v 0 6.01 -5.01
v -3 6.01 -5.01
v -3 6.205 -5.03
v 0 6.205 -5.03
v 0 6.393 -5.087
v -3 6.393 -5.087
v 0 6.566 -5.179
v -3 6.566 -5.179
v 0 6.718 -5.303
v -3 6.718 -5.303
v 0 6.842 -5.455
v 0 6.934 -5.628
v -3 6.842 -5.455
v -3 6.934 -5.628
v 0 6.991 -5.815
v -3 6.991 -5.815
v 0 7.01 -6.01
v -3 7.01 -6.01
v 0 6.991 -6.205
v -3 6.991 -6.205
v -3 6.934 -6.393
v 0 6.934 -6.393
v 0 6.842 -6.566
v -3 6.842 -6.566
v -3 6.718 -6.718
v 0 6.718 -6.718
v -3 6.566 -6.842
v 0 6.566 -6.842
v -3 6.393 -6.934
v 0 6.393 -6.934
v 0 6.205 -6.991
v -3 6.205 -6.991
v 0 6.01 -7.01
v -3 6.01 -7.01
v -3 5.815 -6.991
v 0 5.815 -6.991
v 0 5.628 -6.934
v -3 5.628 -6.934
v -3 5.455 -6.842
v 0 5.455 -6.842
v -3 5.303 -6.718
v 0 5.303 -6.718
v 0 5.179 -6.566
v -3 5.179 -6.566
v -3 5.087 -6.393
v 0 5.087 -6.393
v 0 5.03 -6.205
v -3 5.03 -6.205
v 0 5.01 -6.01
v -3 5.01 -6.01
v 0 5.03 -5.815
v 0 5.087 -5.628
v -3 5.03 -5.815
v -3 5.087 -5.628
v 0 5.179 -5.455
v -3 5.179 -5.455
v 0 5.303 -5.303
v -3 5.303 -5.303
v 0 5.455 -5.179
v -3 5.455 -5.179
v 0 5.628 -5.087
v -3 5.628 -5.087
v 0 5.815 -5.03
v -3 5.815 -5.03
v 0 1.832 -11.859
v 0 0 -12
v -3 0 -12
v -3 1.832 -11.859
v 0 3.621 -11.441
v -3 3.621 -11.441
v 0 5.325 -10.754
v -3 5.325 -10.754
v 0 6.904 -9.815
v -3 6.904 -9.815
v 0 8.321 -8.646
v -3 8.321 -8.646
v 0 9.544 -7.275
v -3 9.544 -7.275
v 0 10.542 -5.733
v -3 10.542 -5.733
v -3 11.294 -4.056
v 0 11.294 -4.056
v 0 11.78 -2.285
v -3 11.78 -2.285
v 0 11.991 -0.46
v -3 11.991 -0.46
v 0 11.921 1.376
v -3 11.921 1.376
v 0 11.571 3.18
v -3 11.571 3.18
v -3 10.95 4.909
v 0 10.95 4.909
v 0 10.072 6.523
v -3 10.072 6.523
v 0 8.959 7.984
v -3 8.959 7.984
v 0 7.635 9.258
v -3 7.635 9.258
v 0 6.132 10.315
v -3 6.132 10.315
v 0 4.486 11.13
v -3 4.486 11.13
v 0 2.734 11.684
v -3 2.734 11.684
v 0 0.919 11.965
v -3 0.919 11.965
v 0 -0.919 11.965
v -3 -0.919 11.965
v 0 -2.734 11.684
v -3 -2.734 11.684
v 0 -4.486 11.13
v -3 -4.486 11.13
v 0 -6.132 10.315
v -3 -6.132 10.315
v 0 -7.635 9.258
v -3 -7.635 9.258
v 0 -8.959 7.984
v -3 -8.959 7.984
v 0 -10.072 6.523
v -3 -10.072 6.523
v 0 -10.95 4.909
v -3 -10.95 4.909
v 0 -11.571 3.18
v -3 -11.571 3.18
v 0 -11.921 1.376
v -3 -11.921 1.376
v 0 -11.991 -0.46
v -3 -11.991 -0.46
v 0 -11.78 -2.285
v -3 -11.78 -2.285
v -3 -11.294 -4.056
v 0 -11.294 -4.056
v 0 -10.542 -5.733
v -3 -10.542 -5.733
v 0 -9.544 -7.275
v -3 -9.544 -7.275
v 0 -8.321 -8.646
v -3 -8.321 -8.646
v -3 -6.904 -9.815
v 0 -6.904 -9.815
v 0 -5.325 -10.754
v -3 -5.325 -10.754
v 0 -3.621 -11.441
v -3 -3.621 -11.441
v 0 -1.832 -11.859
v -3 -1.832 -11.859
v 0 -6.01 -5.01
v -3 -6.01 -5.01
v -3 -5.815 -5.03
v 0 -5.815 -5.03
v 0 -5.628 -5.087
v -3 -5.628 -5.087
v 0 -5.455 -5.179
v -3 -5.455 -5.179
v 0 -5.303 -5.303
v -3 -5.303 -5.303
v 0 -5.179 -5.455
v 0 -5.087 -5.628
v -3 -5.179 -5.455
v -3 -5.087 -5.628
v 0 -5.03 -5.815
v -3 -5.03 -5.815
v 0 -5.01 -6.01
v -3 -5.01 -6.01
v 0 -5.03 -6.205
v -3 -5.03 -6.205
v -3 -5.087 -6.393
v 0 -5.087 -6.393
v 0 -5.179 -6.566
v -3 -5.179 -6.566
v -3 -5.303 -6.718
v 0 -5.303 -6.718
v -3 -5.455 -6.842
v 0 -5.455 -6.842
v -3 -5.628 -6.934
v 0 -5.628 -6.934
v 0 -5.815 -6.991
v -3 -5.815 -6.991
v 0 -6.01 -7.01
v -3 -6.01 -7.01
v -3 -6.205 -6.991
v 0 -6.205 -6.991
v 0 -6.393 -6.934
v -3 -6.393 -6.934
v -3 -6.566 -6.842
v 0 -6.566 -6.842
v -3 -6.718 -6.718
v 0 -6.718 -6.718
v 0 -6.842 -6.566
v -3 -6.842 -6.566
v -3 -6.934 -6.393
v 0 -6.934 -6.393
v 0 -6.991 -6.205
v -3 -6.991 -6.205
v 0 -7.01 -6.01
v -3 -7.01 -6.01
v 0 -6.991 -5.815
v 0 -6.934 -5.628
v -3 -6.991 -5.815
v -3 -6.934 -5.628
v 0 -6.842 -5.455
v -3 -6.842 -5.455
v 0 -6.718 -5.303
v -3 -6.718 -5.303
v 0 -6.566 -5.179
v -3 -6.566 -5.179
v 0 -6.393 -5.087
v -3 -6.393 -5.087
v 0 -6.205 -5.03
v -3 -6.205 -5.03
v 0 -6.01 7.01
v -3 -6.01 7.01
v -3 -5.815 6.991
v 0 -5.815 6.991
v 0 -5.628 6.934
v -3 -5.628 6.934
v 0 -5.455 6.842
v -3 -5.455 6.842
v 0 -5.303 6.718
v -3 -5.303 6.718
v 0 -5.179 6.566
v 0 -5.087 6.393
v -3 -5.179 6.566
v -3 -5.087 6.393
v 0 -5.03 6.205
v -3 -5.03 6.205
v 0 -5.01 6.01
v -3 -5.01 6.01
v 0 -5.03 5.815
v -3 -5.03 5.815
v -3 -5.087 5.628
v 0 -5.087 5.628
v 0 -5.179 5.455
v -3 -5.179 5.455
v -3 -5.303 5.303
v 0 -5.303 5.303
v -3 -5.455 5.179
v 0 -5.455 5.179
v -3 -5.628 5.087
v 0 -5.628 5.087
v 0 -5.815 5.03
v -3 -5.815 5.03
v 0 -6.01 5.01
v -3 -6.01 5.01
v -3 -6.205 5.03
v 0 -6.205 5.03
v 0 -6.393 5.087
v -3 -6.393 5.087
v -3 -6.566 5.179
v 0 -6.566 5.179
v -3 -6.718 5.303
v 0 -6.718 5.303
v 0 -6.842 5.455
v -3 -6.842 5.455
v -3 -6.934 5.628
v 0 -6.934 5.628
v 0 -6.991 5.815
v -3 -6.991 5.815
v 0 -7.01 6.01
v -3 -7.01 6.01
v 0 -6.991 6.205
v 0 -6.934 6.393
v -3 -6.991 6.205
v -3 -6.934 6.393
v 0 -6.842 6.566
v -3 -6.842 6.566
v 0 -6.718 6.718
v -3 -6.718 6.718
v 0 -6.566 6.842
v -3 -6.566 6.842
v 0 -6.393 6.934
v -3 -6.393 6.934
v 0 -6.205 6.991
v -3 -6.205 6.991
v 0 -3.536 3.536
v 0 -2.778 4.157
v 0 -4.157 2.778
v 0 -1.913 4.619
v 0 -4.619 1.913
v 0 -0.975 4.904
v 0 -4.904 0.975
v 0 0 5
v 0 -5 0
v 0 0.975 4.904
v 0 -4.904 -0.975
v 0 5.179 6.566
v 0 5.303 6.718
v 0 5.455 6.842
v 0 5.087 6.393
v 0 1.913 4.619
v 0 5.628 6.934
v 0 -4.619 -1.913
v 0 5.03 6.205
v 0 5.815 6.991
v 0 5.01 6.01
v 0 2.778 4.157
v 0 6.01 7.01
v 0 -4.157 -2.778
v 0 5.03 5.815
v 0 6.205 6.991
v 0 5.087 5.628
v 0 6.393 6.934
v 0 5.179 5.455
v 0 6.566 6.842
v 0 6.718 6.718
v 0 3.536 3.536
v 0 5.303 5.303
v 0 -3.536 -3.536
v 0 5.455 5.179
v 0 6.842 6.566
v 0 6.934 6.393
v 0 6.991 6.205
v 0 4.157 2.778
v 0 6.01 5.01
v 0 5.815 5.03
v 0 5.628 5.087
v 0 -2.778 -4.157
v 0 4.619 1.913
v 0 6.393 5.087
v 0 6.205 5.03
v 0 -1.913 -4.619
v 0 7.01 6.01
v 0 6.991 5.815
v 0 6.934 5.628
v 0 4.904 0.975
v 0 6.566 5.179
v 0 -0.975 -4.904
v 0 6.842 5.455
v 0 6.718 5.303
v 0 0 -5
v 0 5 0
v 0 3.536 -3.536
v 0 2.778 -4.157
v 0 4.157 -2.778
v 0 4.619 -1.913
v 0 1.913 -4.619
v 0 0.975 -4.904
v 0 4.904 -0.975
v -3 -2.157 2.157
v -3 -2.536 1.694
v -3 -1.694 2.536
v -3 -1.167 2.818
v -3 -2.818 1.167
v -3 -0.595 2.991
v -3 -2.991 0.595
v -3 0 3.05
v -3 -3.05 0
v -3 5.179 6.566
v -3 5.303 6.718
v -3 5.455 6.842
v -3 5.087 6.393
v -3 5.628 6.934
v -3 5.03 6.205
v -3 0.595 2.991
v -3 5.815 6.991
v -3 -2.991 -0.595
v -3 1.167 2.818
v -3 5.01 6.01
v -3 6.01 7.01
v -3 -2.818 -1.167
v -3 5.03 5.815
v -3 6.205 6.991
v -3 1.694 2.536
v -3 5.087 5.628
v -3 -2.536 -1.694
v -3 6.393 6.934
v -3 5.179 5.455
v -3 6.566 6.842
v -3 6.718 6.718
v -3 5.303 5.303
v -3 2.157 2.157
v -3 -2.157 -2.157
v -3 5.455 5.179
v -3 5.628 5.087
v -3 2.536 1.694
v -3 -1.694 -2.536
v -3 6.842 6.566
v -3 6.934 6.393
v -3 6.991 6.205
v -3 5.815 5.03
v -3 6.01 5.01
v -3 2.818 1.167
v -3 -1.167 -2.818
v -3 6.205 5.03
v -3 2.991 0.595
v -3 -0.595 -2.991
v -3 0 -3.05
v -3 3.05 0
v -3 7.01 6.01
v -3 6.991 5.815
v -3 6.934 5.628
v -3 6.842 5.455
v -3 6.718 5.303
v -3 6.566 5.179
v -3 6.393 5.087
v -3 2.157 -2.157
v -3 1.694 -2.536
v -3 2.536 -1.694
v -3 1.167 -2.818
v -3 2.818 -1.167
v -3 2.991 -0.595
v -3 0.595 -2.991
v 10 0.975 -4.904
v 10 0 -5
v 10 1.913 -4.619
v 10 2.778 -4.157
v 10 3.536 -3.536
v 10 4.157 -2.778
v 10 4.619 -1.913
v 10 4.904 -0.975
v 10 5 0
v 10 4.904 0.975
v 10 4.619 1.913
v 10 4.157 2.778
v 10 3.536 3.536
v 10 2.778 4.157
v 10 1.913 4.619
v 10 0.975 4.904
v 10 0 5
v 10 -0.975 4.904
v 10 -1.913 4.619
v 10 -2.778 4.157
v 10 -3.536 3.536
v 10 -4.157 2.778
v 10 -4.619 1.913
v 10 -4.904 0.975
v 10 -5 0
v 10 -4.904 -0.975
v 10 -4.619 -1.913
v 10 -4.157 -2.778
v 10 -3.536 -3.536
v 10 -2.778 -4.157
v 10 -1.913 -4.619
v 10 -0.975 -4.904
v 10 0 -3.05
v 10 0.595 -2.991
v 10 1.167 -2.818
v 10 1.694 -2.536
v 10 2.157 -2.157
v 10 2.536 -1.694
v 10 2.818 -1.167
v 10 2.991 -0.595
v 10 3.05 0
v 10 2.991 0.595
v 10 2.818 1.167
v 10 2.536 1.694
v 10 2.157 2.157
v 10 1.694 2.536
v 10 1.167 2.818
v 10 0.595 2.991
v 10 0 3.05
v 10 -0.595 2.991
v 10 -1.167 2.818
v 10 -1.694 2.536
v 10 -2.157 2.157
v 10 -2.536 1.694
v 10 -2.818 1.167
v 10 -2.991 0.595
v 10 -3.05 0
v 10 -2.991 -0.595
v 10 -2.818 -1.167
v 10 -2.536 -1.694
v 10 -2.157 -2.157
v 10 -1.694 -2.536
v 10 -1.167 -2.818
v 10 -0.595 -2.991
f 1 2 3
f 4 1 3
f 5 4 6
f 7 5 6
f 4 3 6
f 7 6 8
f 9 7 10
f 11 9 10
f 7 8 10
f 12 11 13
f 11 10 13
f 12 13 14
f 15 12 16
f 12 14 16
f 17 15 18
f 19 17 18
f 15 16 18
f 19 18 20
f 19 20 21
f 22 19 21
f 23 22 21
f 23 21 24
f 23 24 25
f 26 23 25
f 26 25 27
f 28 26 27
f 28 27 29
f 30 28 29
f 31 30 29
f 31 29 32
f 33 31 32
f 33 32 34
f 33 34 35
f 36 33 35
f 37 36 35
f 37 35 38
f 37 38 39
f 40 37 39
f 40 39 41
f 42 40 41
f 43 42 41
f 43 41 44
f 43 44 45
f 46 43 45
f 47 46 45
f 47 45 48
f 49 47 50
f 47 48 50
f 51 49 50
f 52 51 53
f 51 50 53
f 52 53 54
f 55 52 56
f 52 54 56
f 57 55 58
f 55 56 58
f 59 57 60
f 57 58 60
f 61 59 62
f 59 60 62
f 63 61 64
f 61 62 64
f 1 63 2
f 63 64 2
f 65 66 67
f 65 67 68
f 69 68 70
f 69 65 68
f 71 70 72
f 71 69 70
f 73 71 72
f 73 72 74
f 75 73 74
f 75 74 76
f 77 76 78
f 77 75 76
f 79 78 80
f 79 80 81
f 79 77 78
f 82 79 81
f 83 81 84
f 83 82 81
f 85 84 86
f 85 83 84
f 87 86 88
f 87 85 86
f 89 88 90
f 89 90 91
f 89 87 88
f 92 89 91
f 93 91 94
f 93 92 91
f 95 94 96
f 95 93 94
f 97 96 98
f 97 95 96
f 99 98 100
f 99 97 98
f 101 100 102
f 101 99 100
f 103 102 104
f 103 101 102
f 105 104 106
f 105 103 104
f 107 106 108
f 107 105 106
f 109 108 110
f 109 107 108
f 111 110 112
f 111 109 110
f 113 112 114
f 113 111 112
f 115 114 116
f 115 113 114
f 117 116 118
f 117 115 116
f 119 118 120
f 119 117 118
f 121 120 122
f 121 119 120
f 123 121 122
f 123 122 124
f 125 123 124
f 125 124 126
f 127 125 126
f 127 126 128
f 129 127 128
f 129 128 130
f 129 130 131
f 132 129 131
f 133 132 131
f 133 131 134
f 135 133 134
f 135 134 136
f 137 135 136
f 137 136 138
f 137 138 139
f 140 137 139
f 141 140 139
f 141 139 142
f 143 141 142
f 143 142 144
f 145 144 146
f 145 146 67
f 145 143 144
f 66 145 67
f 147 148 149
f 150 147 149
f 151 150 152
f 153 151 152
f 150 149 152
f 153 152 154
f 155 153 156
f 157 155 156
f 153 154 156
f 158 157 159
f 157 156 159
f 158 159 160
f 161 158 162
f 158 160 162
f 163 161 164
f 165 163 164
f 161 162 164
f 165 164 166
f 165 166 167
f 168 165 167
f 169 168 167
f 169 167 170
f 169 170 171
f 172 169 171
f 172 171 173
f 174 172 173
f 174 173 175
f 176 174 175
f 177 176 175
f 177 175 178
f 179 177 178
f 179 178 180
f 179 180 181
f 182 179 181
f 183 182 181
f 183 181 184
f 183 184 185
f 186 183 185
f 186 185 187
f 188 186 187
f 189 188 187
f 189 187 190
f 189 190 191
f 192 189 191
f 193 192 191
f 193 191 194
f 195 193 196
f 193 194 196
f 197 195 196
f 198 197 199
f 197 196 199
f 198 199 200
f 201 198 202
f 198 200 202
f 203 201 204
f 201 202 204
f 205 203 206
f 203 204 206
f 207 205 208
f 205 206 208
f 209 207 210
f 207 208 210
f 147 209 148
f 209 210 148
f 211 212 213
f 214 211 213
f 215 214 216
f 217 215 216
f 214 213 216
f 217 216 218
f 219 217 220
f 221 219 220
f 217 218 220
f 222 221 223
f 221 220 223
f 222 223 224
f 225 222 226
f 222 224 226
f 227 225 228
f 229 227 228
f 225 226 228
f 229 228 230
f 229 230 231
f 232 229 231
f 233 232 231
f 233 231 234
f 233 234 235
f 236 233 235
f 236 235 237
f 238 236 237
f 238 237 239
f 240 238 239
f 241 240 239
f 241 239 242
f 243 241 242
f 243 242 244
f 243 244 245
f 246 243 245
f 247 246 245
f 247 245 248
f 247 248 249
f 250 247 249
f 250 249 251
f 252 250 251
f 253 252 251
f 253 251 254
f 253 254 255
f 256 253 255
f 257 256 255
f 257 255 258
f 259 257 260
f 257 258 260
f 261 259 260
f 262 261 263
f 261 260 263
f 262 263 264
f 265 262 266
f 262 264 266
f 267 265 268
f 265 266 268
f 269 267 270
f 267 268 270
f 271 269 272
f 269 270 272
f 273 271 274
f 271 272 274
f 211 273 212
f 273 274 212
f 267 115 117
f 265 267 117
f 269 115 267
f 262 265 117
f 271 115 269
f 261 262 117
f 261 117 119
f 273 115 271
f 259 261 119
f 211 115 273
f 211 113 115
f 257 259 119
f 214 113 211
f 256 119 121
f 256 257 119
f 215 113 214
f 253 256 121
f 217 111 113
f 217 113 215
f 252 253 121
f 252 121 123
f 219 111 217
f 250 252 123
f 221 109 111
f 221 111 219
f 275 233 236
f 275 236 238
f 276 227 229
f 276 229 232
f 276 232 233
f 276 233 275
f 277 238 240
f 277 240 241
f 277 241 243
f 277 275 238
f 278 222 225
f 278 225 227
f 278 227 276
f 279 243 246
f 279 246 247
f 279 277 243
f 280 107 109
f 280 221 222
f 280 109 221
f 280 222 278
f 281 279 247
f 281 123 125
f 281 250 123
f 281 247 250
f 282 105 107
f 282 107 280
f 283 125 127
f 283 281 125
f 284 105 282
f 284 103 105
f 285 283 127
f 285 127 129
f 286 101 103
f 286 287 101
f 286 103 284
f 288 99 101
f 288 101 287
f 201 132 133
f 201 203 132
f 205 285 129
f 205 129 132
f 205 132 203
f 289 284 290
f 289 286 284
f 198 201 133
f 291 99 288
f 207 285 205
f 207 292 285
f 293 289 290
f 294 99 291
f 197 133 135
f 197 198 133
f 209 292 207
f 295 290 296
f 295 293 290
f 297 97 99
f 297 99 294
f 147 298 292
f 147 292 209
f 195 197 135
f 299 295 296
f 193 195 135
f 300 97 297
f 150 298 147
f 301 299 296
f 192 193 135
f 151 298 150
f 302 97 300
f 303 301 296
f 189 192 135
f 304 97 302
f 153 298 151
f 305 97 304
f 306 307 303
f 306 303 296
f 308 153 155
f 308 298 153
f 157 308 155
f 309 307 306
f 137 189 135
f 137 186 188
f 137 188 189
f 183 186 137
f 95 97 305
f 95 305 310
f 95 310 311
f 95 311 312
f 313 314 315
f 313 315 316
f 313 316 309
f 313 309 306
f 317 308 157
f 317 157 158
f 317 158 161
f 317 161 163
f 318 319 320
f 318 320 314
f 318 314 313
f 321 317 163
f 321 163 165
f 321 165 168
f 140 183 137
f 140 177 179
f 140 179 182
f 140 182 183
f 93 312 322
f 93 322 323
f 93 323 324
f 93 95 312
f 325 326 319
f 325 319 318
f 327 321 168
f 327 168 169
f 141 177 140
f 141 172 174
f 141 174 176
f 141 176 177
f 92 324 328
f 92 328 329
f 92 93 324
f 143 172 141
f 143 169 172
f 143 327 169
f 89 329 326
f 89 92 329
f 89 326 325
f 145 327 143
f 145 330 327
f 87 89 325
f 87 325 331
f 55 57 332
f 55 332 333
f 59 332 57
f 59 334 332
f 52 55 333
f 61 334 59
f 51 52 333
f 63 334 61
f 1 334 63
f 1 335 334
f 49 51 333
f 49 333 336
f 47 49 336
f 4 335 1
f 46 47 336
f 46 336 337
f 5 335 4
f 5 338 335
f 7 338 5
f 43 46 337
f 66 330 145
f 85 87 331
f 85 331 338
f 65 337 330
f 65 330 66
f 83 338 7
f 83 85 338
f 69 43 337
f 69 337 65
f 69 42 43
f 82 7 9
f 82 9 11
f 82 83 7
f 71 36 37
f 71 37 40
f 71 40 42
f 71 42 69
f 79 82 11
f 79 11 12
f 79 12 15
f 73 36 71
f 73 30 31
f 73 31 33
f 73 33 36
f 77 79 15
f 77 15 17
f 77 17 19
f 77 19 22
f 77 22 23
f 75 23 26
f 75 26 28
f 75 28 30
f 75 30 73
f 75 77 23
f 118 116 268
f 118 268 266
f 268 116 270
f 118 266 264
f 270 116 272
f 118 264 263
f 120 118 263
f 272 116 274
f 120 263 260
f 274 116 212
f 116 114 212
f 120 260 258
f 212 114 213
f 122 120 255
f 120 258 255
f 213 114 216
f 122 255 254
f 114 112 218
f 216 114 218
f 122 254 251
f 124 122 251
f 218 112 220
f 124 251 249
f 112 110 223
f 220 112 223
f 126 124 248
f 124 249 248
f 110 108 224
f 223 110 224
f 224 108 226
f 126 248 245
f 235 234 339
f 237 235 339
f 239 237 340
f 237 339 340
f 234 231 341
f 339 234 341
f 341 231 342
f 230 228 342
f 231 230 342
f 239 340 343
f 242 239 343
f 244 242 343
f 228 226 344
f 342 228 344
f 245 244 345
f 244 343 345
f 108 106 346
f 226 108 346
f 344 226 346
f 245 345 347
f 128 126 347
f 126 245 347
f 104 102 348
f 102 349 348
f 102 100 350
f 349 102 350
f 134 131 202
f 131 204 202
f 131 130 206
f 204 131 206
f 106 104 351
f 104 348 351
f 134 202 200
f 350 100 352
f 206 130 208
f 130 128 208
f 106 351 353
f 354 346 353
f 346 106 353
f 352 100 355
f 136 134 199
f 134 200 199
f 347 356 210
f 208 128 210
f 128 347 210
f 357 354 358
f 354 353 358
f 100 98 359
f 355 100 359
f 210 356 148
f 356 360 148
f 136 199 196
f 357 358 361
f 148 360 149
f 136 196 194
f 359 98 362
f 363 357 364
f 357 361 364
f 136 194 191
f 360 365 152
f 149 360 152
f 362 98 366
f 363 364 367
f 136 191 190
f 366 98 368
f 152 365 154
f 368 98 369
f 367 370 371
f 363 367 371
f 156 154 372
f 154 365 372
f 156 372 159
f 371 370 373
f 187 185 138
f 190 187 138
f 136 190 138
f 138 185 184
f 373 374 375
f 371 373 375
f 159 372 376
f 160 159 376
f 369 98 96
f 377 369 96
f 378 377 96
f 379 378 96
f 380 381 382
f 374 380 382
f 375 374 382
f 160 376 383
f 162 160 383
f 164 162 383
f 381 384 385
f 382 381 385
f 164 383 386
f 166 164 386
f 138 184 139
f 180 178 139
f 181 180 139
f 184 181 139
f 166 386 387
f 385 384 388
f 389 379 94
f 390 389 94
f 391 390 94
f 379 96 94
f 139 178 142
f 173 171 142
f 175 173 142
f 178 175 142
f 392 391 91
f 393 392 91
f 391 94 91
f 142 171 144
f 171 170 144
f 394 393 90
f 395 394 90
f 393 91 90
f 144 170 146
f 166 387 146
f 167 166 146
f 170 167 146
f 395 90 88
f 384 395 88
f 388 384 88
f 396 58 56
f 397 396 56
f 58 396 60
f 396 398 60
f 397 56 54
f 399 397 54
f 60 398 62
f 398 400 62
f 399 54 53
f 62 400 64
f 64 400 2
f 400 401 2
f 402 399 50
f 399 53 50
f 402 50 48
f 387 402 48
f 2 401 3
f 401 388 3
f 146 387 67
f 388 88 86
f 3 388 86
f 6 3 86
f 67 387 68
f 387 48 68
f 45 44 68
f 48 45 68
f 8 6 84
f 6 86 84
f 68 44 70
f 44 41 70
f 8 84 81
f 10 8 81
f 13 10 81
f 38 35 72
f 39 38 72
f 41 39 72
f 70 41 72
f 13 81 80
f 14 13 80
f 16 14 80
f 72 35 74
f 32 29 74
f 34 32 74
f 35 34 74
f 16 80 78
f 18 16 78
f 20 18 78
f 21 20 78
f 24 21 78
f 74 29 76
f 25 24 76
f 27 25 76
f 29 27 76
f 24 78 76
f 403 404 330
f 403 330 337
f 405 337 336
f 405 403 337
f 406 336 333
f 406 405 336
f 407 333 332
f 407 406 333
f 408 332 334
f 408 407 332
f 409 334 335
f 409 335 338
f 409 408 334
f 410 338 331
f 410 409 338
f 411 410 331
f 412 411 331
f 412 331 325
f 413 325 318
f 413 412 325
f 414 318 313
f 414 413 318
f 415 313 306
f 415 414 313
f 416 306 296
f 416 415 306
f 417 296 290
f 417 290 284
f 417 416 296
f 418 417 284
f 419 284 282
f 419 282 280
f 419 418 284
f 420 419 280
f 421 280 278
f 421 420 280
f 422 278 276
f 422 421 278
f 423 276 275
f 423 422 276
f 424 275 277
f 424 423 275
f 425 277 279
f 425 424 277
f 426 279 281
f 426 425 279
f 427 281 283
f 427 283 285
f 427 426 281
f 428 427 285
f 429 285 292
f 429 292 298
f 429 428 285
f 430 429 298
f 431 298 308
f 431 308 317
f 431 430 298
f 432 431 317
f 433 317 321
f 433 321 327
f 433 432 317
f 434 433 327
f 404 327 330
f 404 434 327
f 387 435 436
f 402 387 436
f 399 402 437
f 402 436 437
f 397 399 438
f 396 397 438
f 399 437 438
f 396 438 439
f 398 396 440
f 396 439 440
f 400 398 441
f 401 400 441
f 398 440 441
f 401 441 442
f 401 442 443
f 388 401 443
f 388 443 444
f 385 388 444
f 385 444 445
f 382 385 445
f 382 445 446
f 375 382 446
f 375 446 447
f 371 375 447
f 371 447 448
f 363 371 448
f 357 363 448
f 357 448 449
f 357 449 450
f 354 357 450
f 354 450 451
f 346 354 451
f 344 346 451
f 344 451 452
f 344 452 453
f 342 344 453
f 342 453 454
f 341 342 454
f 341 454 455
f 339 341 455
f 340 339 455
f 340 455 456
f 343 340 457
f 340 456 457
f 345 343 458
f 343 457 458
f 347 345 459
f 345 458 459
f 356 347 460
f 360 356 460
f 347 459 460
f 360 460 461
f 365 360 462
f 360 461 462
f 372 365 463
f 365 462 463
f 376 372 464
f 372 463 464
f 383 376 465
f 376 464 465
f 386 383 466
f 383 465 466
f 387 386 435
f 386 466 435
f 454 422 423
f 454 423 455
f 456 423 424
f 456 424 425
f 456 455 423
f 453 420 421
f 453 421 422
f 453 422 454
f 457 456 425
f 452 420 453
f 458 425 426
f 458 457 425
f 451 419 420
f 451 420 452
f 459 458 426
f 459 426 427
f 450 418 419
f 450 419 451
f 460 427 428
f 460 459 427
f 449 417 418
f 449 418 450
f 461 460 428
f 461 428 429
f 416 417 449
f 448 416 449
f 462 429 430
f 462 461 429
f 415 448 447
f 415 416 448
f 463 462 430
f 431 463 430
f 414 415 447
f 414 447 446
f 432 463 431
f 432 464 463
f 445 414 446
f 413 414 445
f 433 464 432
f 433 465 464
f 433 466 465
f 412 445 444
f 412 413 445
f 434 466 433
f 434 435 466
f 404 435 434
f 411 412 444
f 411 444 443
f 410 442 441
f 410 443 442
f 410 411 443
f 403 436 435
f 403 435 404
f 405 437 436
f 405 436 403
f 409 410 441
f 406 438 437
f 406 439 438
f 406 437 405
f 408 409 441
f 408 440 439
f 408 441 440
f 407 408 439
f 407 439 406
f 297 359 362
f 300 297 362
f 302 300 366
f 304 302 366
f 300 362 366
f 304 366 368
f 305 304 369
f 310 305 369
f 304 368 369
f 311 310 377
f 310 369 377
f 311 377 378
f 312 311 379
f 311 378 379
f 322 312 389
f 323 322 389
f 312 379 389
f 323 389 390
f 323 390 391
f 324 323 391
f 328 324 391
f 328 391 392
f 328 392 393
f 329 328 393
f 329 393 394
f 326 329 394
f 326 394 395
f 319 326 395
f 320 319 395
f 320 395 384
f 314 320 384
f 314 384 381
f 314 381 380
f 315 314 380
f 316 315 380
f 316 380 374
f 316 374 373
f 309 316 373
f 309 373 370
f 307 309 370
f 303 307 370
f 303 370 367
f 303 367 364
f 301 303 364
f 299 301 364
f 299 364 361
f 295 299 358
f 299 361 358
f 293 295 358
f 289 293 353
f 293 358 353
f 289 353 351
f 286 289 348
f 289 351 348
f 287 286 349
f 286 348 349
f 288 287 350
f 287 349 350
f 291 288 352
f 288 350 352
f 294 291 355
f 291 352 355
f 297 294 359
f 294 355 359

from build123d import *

# Parameters (mm, degrees)
SKETCH1_R           = 12
SKETCH1_R_2         = 3.05
BOSS_EXTRUDE1_DEPTH = 3
BOSS_EXTRUDE2_START = 10
SKETCH1_3_R         = 5
SKETCH1_3_R_2       = 3.05
BOSS_EXTRUDE2_DEPTH = 10
SKETCH2_R           = 1
CUT_EXTRUDE1_DEPTH  = 10


with BuildPart() as part:
    # Sketch1 → Boss-Extrude1 (new body)
    with BuildSketch(Plane(origin=(0, 0, 0), x_dir=(0, 0, -1), z_dir=(1, 0, 0))):
        Circle(SKETCH1_R)
        Circle(SKETCH1_R_2, mode=Mode.SUBTRACT)
    extrude(amount=-BOSS_EXTRUDE1_DEPTH)

    # Sketch1<3> → Boss-Extrude2 (add)
    with BuildSketch(Plane(origin=(0, 0, 0), x_dir=(0, 0, -1), z_dir=(1, 0, 0)).offset(BOSS_EXTRUDE2_START)):
        Circle(SKETCH1_3_R)
        Circle(SKETCH1_3_R_2, mode=Mode.SUBTRACT)
    extrude(amount=-BOSS_EXTRUDE2_DEPTH)

    # Sketch2 → Cut-Extrude1 (cut)
    with BuildSketch(Plane.ZY.offset(3)):
        with Locations((-6.01040764, 6.01040764)):
            Circle(SKETCH2_R)
        with Locations((-6.01040764, -6.01040764)):
            Circle(SKETCH2_R)
        with Locations((6.01040764, 6.01040764)):
            Circle(SKETCH2_R)
        with Locations((6.01040764, -6.01040764)):
            Circle(SKETCH2_R)
    extrude(amount=-CUT_EXTRUDE1_DEPTH, mode=Mode.SUBTRACT)


solid = part.part
